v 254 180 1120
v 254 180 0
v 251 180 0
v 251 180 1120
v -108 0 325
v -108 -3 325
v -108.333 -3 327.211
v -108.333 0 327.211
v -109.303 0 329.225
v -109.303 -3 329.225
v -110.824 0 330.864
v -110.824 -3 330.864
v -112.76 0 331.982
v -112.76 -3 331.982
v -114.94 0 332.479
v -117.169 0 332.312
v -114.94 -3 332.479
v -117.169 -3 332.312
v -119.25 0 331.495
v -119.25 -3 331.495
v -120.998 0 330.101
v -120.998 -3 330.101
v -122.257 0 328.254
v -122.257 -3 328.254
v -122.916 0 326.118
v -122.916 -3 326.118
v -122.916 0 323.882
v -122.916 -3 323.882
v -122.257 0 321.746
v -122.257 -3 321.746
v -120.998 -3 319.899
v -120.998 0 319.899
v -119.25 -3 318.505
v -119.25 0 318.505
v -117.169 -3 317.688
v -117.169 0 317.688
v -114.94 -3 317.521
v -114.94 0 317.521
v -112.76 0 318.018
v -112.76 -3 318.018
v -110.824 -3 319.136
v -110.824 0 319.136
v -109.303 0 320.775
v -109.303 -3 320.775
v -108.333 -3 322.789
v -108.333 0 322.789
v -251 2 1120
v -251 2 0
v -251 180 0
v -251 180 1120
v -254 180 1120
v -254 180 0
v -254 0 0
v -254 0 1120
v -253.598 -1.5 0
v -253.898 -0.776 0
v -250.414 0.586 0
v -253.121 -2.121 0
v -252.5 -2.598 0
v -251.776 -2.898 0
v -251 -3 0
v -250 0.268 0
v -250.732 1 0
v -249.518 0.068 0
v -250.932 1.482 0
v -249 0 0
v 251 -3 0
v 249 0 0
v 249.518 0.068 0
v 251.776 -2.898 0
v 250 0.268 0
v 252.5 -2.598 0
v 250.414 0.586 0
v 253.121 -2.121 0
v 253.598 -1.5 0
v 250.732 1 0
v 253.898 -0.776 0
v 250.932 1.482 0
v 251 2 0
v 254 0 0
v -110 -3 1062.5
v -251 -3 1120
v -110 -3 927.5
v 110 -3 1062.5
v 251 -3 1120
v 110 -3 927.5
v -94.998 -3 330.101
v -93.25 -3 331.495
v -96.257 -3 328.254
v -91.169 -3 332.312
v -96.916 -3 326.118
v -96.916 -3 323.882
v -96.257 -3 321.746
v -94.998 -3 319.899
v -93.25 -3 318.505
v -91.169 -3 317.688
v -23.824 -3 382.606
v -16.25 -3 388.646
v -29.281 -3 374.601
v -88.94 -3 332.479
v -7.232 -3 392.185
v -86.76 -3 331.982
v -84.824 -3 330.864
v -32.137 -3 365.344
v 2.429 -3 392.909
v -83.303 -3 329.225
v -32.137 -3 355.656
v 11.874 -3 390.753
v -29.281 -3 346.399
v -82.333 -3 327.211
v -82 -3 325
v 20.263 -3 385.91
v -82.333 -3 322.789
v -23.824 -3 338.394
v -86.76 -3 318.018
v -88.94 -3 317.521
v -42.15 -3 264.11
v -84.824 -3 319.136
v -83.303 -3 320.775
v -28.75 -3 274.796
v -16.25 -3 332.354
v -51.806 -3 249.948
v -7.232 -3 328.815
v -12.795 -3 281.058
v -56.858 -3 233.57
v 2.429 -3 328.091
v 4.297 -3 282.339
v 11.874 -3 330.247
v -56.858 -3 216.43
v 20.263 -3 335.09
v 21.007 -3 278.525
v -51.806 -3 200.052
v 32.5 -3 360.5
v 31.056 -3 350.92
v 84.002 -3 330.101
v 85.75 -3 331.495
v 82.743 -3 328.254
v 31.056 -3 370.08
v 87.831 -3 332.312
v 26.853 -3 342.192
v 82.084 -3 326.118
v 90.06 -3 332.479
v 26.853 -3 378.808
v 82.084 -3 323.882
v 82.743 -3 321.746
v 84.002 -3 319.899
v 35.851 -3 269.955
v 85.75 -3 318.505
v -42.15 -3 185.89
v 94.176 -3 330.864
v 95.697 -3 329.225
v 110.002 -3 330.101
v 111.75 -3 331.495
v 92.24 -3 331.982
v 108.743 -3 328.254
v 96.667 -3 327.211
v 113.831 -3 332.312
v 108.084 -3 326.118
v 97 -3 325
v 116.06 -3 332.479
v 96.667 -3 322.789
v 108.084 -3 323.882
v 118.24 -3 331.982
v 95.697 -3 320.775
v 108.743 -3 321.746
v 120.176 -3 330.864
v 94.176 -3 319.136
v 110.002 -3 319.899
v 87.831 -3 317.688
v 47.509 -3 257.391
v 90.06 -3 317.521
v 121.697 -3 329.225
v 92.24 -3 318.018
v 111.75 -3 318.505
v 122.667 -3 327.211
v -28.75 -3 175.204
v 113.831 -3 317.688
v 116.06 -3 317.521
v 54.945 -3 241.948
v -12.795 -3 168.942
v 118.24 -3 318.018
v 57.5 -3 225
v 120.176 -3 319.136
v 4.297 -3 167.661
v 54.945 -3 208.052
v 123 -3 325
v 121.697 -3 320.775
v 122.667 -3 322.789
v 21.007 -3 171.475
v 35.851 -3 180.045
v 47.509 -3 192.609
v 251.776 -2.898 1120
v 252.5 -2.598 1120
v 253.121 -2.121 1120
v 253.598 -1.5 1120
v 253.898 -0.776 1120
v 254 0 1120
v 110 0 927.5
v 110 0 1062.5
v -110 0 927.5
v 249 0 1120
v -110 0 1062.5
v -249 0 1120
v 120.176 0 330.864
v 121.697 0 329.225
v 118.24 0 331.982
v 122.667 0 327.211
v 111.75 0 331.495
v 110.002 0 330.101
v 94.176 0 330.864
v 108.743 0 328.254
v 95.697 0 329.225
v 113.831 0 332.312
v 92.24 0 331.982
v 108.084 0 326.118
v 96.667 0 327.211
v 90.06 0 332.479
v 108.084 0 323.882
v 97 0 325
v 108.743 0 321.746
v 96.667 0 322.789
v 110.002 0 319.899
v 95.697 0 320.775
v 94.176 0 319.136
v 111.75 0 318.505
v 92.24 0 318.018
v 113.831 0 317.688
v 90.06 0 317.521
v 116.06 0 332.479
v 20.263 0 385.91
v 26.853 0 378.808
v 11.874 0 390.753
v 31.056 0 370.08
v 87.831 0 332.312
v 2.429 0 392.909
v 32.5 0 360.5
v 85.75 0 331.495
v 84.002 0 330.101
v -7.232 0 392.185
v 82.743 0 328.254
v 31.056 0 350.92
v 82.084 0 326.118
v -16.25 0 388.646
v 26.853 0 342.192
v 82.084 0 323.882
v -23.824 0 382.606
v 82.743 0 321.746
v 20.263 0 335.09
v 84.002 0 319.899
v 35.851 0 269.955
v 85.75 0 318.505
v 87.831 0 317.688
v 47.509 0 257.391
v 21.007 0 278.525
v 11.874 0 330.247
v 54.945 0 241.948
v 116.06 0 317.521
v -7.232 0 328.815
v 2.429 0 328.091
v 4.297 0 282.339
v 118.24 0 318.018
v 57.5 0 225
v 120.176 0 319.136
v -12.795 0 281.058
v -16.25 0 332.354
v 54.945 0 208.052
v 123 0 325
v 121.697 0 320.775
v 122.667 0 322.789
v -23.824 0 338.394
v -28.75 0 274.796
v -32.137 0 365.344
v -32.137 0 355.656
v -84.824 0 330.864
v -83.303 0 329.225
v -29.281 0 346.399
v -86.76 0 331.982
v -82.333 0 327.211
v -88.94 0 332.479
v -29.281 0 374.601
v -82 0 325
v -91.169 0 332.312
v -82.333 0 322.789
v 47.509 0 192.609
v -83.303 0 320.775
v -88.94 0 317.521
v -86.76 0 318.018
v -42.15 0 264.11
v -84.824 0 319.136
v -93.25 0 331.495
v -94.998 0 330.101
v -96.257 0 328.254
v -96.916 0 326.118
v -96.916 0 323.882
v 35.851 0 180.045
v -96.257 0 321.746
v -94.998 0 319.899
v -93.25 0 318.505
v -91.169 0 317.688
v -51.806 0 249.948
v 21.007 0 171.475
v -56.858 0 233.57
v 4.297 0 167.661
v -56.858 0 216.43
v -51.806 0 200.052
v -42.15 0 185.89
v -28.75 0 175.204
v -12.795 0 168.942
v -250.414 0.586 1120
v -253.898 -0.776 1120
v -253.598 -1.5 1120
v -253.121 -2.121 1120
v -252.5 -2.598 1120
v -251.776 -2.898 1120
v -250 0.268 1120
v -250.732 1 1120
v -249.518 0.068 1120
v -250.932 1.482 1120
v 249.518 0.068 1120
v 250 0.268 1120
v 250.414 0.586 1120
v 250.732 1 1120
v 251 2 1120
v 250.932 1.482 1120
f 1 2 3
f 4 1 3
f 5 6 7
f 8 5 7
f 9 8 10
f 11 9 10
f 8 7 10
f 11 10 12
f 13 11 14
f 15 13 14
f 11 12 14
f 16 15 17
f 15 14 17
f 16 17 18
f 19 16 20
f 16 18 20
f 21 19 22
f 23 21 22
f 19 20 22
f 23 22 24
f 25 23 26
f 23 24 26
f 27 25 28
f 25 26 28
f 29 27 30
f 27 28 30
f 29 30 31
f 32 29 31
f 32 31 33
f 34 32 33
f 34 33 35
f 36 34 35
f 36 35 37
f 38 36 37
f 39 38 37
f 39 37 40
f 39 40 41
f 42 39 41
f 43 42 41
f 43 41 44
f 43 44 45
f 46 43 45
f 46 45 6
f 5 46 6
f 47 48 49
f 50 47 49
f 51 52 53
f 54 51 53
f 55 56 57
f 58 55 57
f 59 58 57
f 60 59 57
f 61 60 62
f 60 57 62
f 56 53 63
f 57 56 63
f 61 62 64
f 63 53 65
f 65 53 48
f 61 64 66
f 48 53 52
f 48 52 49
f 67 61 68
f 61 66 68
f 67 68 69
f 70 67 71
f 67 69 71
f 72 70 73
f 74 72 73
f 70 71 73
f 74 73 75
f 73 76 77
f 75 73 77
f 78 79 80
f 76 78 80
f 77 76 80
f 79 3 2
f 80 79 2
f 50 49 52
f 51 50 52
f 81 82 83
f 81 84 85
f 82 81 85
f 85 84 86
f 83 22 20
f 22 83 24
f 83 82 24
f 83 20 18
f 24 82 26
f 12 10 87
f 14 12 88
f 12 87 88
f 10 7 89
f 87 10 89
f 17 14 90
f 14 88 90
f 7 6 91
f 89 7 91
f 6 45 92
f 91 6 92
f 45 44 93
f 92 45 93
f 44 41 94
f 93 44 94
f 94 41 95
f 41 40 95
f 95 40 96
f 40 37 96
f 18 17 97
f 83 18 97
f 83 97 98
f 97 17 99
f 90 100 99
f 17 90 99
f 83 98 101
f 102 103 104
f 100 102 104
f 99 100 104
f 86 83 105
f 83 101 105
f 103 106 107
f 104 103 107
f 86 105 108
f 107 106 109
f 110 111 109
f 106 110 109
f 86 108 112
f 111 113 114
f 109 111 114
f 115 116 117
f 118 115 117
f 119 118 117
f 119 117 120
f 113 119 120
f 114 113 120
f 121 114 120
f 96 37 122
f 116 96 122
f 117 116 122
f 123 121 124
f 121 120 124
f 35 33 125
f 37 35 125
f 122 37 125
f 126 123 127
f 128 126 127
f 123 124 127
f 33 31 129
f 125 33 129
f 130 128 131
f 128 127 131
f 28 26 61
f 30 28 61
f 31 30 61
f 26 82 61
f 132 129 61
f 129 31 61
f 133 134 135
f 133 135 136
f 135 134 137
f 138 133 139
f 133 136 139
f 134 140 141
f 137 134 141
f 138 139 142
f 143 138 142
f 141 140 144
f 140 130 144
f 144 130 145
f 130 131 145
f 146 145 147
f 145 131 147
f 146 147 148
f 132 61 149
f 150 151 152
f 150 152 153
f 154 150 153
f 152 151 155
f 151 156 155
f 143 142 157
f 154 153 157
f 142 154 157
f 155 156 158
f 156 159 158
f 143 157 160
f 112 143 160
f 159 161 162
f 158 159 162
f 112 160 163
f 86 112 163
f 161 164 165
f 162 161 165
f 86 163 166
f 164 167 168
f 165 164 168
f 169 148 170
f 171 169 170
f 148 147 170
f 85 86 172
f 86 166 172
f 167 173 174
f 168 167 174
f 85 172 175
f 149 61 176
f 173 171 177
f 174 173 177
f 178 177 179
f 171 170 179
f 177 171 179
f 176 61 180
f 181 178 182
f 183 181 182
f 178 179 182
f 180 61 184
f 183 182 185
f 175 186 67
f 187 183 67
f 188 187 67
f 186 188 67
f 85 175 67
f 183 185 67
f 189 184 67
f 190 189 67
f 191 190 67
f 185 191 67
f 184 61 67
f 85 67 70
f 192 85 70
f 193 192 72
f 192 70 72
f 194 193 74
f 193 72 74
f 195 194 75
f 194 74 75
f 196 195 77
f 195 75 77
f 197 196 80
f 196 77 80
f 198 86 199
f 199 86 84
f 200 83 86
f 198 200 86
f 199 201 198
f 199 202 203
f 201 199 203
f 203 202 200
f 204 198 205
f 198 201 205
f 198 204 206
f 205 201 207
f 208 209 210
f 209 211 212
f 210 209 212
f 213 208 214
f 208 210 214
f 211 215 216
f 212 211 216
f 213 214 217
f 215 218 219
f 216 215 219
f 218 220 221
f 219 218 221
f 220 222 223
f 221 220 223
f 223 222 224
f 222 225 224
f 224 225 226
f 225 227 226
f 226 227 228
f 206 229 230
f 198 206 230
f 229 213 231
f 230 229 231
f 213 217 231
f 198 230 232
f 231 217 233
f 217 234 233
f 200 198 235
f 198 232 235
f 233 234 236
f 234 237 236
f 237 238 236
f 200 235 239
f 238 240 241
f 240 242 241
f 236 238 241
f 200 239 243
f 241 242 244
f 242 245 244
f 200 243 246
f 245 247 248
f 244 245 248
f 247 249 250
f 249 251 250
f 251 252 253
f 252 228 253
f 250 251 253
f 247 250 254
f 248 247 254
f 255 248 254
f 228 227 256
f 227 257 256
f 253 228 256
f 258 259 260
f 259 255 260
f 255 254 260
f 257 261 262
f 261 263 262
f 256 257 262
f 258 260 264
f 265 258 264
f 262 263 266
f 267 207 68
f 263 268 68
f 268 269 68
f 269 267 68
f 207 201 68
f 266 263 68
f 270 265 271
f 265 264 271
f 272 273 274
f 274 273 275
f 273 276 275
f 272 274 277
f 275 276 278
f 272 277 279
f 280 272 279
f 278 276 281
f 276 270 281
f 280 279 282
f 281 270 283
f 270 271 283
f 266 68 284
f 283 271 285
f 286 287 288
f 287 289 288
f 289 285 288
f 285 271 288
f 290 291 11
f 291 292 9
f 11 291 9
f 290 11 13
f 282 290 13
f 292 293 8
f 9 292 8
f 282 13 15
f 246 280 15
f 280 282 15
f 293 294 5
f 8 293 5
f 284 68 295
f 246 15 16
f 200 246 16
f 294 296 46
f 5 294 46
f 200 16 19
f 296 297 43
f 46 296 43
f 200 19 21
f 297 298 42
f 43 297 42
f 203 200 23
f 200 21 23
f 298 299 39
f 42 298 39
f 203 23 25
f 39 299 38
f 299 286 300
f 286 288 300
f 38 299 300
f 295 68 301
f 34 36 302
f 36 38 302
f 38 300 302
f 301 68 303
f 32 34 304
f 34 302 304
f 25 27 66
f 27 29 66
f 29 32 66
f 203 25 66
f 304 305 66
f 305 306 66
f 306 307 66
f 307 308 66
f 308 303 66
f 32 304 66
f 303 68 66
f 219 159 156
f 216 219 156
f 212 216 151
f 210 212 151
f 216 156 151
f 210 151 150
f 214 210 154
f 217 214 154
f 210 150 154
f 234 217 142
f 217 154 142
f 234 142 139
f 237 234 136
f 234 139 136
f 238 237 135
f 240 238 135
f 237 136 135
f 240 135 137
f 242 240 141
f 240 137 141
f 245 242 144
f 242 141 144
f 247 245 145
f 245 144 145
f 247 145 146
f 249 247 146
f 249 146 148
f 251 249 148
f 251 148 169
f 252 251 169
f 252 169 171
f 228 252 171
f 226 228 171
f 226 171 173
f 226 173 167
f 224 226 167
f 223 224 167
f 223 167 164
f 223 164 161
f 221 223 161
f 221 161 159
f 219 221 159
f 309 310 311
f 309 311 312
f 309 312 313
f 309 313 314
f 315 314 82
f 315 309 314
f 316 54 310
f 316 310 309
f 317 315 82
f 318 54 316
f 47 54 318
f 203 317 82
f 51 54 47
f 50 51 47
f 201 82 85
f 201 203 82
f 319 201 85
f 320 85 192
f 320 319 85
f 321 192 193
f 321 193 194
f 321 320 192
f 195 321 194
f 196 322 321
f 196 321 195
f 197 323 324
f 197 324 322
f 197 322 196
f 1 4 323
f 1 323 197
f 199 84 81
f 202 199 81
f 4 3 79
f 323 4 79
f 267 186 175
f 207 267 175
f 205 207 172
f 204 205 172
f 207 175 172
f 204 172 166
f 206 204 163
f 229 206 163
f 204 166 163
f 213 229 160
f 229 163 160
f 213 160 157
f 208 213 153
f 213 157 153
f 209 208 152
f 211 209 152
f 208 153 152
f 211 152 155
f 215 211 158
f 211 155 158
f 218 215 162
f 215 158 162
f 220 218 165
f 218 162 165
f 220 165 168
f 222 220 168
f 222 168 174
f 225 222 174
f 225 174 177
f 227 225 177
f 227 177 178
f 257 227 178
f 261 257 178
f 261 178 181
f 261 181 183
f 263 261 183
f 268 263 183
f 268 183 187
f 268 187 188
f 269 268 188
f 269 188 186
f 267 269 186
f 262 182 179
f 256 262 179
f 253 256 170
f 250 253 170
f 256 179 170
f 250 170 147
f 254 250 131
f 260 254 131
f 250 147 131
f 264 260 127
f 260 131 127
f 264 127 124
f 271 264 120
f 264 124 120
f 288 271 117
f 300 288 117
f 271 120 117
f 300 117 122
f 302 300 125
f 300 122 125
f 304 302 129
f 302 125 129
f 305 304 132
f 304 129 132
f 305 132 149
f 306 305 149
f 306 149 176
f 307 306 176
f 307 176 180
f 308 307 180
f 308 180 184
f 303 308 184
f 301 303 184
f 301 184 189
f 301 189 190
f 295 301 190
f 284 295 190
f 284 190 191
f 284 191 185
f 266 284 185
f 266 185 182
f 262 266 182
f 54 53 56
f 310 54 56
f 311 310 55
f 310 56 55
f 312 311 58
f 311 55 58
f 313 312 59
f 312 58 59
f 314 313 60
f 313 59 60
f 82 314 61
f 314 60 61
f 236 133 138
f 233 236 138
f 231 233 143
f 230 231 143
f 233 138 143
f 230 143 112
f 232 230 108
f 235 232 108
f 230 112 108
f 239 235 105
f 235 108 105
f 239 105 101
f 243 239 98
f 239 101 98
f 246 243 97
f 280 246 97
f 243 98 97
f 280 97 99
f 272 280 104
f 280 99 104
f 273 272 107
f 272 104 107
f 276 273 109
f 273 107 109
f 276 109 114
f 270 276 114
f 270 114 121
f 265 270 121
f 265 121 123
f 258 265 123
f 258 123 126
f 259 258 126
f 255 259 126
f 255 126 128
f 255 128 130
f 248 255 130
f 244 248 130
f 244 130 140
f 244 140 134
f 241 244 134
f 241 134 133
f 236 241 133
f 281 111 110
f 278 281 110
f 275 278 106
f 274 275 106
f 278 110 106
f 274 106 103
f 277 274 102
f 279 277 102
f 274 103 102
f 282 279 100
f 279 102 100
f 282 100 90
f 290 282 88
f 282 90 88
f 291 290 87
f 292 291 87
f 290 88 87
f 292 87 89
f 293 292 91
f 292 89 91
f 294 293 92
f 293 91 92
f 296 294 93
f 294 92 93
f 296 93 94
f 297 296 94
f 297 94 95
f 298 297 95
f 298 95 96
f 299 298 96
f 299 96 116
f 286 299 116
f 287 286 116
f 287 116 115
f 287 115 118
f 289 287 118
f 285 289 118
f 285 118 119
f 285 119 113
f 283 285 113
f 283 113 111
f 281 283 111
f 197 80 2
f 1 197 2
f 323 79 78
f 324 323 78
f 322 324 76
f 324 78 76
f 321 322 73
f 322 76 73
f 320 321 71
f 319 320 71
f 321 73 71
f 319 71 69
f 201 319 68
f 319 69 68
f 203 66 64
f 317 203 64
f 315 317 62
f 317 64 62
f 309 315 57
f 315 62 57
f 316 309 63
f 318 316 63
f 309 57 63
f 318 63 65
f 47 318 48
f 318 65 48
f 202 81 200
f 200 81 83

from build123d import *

# Parameters (mm, degrees)
F1_DEPTH = 1120
F2_R     = 57.5
F3_DEPTH = 183.001
F4_R     = 32.5
F5_DEPTH = 183.001
F7_DEPTH = 183.001
F8_R     = 7.5
F9_DEPTH = 183.001


with BuildPart() as f1:
    # F0 (on Top) → F1 (new body)
    with BuildSketch(Plane.XY):
        with BuildLine():
            Line((249, 0), (0, 0))
            Line((0, 0), (-249, 0))
            ThreePointArc((-249, 0), (-250.414214, 0.585786), (-251, 2))
            Line((-251, 2), (-251, 180))
            Line((-251, 180), (-254, 180))
            Line((-254, 180), (-254, 0))
            ThreePointArc((-254, 0), (-253.12132, -2.12132), (-251, -3))
            Line((-251, -3), (0, -3))
            Line((0, -3), (251, -3))
            ThreePointArc((251, -3), (253.12132, -2.12132), (254, 0))
            Line((254, 0), (254, 180))
            Line((254, 180), (251, 180))
            Line((251, 180), (251, 2))
            ThreePointArc((251, 2), (250.414214, 0.585786), (249, 0))
        make_face()
    extrude(amount=F1_DEPTH)

    # F2 (on face) → F3 (cut, through all)
    with BuildSketch(Plane.XZ.offset(3)):
        with Locations((0, 225)):
            Circle(F2_R)
    extrude(amount=-F3_DEPTH, mode=Mode.SUBTRACT)

    # F4 (on face) → F5 (cut, through all)
    with BuildSketch(Plane.XZ.offset(3)):
        with Locations((0, 360.5)):
            Circle(F4_R)
    extrude(amount=-F5_DEPTH, mode=Mode.SUBTRACT)

    # F6 (on face) → F7 (cut, through all)
    with BuildSketch(Plane.XZ.offset(3)):
        Polygon((-110, 927.5), (0, 927.5), (110, 927.5), (110, 1062.5), (0, 1062.5), (-110, 1062.5), align=None)
    extrude(amount=-F7_DEPTH, mode=Mode.SUBTRACT)

    # F8 (on face) → F9 (cut, through all)
    with BuildSketch(Plane.XZ.offset(3)):
        with Locations((-115.5, 325)):
            Circle(F8_R)
        with Locations((-89.5, 325)):
            Circle(F8_R)
        with Locations((89.5, 325)):
            Circle(F8_R)
        with Locations((115.5, 325)):
            Circle(F8_R)
    extrude(amount=-F9_DEPTH, mode=Mode.SUBTRACT)


solid = f1.part
